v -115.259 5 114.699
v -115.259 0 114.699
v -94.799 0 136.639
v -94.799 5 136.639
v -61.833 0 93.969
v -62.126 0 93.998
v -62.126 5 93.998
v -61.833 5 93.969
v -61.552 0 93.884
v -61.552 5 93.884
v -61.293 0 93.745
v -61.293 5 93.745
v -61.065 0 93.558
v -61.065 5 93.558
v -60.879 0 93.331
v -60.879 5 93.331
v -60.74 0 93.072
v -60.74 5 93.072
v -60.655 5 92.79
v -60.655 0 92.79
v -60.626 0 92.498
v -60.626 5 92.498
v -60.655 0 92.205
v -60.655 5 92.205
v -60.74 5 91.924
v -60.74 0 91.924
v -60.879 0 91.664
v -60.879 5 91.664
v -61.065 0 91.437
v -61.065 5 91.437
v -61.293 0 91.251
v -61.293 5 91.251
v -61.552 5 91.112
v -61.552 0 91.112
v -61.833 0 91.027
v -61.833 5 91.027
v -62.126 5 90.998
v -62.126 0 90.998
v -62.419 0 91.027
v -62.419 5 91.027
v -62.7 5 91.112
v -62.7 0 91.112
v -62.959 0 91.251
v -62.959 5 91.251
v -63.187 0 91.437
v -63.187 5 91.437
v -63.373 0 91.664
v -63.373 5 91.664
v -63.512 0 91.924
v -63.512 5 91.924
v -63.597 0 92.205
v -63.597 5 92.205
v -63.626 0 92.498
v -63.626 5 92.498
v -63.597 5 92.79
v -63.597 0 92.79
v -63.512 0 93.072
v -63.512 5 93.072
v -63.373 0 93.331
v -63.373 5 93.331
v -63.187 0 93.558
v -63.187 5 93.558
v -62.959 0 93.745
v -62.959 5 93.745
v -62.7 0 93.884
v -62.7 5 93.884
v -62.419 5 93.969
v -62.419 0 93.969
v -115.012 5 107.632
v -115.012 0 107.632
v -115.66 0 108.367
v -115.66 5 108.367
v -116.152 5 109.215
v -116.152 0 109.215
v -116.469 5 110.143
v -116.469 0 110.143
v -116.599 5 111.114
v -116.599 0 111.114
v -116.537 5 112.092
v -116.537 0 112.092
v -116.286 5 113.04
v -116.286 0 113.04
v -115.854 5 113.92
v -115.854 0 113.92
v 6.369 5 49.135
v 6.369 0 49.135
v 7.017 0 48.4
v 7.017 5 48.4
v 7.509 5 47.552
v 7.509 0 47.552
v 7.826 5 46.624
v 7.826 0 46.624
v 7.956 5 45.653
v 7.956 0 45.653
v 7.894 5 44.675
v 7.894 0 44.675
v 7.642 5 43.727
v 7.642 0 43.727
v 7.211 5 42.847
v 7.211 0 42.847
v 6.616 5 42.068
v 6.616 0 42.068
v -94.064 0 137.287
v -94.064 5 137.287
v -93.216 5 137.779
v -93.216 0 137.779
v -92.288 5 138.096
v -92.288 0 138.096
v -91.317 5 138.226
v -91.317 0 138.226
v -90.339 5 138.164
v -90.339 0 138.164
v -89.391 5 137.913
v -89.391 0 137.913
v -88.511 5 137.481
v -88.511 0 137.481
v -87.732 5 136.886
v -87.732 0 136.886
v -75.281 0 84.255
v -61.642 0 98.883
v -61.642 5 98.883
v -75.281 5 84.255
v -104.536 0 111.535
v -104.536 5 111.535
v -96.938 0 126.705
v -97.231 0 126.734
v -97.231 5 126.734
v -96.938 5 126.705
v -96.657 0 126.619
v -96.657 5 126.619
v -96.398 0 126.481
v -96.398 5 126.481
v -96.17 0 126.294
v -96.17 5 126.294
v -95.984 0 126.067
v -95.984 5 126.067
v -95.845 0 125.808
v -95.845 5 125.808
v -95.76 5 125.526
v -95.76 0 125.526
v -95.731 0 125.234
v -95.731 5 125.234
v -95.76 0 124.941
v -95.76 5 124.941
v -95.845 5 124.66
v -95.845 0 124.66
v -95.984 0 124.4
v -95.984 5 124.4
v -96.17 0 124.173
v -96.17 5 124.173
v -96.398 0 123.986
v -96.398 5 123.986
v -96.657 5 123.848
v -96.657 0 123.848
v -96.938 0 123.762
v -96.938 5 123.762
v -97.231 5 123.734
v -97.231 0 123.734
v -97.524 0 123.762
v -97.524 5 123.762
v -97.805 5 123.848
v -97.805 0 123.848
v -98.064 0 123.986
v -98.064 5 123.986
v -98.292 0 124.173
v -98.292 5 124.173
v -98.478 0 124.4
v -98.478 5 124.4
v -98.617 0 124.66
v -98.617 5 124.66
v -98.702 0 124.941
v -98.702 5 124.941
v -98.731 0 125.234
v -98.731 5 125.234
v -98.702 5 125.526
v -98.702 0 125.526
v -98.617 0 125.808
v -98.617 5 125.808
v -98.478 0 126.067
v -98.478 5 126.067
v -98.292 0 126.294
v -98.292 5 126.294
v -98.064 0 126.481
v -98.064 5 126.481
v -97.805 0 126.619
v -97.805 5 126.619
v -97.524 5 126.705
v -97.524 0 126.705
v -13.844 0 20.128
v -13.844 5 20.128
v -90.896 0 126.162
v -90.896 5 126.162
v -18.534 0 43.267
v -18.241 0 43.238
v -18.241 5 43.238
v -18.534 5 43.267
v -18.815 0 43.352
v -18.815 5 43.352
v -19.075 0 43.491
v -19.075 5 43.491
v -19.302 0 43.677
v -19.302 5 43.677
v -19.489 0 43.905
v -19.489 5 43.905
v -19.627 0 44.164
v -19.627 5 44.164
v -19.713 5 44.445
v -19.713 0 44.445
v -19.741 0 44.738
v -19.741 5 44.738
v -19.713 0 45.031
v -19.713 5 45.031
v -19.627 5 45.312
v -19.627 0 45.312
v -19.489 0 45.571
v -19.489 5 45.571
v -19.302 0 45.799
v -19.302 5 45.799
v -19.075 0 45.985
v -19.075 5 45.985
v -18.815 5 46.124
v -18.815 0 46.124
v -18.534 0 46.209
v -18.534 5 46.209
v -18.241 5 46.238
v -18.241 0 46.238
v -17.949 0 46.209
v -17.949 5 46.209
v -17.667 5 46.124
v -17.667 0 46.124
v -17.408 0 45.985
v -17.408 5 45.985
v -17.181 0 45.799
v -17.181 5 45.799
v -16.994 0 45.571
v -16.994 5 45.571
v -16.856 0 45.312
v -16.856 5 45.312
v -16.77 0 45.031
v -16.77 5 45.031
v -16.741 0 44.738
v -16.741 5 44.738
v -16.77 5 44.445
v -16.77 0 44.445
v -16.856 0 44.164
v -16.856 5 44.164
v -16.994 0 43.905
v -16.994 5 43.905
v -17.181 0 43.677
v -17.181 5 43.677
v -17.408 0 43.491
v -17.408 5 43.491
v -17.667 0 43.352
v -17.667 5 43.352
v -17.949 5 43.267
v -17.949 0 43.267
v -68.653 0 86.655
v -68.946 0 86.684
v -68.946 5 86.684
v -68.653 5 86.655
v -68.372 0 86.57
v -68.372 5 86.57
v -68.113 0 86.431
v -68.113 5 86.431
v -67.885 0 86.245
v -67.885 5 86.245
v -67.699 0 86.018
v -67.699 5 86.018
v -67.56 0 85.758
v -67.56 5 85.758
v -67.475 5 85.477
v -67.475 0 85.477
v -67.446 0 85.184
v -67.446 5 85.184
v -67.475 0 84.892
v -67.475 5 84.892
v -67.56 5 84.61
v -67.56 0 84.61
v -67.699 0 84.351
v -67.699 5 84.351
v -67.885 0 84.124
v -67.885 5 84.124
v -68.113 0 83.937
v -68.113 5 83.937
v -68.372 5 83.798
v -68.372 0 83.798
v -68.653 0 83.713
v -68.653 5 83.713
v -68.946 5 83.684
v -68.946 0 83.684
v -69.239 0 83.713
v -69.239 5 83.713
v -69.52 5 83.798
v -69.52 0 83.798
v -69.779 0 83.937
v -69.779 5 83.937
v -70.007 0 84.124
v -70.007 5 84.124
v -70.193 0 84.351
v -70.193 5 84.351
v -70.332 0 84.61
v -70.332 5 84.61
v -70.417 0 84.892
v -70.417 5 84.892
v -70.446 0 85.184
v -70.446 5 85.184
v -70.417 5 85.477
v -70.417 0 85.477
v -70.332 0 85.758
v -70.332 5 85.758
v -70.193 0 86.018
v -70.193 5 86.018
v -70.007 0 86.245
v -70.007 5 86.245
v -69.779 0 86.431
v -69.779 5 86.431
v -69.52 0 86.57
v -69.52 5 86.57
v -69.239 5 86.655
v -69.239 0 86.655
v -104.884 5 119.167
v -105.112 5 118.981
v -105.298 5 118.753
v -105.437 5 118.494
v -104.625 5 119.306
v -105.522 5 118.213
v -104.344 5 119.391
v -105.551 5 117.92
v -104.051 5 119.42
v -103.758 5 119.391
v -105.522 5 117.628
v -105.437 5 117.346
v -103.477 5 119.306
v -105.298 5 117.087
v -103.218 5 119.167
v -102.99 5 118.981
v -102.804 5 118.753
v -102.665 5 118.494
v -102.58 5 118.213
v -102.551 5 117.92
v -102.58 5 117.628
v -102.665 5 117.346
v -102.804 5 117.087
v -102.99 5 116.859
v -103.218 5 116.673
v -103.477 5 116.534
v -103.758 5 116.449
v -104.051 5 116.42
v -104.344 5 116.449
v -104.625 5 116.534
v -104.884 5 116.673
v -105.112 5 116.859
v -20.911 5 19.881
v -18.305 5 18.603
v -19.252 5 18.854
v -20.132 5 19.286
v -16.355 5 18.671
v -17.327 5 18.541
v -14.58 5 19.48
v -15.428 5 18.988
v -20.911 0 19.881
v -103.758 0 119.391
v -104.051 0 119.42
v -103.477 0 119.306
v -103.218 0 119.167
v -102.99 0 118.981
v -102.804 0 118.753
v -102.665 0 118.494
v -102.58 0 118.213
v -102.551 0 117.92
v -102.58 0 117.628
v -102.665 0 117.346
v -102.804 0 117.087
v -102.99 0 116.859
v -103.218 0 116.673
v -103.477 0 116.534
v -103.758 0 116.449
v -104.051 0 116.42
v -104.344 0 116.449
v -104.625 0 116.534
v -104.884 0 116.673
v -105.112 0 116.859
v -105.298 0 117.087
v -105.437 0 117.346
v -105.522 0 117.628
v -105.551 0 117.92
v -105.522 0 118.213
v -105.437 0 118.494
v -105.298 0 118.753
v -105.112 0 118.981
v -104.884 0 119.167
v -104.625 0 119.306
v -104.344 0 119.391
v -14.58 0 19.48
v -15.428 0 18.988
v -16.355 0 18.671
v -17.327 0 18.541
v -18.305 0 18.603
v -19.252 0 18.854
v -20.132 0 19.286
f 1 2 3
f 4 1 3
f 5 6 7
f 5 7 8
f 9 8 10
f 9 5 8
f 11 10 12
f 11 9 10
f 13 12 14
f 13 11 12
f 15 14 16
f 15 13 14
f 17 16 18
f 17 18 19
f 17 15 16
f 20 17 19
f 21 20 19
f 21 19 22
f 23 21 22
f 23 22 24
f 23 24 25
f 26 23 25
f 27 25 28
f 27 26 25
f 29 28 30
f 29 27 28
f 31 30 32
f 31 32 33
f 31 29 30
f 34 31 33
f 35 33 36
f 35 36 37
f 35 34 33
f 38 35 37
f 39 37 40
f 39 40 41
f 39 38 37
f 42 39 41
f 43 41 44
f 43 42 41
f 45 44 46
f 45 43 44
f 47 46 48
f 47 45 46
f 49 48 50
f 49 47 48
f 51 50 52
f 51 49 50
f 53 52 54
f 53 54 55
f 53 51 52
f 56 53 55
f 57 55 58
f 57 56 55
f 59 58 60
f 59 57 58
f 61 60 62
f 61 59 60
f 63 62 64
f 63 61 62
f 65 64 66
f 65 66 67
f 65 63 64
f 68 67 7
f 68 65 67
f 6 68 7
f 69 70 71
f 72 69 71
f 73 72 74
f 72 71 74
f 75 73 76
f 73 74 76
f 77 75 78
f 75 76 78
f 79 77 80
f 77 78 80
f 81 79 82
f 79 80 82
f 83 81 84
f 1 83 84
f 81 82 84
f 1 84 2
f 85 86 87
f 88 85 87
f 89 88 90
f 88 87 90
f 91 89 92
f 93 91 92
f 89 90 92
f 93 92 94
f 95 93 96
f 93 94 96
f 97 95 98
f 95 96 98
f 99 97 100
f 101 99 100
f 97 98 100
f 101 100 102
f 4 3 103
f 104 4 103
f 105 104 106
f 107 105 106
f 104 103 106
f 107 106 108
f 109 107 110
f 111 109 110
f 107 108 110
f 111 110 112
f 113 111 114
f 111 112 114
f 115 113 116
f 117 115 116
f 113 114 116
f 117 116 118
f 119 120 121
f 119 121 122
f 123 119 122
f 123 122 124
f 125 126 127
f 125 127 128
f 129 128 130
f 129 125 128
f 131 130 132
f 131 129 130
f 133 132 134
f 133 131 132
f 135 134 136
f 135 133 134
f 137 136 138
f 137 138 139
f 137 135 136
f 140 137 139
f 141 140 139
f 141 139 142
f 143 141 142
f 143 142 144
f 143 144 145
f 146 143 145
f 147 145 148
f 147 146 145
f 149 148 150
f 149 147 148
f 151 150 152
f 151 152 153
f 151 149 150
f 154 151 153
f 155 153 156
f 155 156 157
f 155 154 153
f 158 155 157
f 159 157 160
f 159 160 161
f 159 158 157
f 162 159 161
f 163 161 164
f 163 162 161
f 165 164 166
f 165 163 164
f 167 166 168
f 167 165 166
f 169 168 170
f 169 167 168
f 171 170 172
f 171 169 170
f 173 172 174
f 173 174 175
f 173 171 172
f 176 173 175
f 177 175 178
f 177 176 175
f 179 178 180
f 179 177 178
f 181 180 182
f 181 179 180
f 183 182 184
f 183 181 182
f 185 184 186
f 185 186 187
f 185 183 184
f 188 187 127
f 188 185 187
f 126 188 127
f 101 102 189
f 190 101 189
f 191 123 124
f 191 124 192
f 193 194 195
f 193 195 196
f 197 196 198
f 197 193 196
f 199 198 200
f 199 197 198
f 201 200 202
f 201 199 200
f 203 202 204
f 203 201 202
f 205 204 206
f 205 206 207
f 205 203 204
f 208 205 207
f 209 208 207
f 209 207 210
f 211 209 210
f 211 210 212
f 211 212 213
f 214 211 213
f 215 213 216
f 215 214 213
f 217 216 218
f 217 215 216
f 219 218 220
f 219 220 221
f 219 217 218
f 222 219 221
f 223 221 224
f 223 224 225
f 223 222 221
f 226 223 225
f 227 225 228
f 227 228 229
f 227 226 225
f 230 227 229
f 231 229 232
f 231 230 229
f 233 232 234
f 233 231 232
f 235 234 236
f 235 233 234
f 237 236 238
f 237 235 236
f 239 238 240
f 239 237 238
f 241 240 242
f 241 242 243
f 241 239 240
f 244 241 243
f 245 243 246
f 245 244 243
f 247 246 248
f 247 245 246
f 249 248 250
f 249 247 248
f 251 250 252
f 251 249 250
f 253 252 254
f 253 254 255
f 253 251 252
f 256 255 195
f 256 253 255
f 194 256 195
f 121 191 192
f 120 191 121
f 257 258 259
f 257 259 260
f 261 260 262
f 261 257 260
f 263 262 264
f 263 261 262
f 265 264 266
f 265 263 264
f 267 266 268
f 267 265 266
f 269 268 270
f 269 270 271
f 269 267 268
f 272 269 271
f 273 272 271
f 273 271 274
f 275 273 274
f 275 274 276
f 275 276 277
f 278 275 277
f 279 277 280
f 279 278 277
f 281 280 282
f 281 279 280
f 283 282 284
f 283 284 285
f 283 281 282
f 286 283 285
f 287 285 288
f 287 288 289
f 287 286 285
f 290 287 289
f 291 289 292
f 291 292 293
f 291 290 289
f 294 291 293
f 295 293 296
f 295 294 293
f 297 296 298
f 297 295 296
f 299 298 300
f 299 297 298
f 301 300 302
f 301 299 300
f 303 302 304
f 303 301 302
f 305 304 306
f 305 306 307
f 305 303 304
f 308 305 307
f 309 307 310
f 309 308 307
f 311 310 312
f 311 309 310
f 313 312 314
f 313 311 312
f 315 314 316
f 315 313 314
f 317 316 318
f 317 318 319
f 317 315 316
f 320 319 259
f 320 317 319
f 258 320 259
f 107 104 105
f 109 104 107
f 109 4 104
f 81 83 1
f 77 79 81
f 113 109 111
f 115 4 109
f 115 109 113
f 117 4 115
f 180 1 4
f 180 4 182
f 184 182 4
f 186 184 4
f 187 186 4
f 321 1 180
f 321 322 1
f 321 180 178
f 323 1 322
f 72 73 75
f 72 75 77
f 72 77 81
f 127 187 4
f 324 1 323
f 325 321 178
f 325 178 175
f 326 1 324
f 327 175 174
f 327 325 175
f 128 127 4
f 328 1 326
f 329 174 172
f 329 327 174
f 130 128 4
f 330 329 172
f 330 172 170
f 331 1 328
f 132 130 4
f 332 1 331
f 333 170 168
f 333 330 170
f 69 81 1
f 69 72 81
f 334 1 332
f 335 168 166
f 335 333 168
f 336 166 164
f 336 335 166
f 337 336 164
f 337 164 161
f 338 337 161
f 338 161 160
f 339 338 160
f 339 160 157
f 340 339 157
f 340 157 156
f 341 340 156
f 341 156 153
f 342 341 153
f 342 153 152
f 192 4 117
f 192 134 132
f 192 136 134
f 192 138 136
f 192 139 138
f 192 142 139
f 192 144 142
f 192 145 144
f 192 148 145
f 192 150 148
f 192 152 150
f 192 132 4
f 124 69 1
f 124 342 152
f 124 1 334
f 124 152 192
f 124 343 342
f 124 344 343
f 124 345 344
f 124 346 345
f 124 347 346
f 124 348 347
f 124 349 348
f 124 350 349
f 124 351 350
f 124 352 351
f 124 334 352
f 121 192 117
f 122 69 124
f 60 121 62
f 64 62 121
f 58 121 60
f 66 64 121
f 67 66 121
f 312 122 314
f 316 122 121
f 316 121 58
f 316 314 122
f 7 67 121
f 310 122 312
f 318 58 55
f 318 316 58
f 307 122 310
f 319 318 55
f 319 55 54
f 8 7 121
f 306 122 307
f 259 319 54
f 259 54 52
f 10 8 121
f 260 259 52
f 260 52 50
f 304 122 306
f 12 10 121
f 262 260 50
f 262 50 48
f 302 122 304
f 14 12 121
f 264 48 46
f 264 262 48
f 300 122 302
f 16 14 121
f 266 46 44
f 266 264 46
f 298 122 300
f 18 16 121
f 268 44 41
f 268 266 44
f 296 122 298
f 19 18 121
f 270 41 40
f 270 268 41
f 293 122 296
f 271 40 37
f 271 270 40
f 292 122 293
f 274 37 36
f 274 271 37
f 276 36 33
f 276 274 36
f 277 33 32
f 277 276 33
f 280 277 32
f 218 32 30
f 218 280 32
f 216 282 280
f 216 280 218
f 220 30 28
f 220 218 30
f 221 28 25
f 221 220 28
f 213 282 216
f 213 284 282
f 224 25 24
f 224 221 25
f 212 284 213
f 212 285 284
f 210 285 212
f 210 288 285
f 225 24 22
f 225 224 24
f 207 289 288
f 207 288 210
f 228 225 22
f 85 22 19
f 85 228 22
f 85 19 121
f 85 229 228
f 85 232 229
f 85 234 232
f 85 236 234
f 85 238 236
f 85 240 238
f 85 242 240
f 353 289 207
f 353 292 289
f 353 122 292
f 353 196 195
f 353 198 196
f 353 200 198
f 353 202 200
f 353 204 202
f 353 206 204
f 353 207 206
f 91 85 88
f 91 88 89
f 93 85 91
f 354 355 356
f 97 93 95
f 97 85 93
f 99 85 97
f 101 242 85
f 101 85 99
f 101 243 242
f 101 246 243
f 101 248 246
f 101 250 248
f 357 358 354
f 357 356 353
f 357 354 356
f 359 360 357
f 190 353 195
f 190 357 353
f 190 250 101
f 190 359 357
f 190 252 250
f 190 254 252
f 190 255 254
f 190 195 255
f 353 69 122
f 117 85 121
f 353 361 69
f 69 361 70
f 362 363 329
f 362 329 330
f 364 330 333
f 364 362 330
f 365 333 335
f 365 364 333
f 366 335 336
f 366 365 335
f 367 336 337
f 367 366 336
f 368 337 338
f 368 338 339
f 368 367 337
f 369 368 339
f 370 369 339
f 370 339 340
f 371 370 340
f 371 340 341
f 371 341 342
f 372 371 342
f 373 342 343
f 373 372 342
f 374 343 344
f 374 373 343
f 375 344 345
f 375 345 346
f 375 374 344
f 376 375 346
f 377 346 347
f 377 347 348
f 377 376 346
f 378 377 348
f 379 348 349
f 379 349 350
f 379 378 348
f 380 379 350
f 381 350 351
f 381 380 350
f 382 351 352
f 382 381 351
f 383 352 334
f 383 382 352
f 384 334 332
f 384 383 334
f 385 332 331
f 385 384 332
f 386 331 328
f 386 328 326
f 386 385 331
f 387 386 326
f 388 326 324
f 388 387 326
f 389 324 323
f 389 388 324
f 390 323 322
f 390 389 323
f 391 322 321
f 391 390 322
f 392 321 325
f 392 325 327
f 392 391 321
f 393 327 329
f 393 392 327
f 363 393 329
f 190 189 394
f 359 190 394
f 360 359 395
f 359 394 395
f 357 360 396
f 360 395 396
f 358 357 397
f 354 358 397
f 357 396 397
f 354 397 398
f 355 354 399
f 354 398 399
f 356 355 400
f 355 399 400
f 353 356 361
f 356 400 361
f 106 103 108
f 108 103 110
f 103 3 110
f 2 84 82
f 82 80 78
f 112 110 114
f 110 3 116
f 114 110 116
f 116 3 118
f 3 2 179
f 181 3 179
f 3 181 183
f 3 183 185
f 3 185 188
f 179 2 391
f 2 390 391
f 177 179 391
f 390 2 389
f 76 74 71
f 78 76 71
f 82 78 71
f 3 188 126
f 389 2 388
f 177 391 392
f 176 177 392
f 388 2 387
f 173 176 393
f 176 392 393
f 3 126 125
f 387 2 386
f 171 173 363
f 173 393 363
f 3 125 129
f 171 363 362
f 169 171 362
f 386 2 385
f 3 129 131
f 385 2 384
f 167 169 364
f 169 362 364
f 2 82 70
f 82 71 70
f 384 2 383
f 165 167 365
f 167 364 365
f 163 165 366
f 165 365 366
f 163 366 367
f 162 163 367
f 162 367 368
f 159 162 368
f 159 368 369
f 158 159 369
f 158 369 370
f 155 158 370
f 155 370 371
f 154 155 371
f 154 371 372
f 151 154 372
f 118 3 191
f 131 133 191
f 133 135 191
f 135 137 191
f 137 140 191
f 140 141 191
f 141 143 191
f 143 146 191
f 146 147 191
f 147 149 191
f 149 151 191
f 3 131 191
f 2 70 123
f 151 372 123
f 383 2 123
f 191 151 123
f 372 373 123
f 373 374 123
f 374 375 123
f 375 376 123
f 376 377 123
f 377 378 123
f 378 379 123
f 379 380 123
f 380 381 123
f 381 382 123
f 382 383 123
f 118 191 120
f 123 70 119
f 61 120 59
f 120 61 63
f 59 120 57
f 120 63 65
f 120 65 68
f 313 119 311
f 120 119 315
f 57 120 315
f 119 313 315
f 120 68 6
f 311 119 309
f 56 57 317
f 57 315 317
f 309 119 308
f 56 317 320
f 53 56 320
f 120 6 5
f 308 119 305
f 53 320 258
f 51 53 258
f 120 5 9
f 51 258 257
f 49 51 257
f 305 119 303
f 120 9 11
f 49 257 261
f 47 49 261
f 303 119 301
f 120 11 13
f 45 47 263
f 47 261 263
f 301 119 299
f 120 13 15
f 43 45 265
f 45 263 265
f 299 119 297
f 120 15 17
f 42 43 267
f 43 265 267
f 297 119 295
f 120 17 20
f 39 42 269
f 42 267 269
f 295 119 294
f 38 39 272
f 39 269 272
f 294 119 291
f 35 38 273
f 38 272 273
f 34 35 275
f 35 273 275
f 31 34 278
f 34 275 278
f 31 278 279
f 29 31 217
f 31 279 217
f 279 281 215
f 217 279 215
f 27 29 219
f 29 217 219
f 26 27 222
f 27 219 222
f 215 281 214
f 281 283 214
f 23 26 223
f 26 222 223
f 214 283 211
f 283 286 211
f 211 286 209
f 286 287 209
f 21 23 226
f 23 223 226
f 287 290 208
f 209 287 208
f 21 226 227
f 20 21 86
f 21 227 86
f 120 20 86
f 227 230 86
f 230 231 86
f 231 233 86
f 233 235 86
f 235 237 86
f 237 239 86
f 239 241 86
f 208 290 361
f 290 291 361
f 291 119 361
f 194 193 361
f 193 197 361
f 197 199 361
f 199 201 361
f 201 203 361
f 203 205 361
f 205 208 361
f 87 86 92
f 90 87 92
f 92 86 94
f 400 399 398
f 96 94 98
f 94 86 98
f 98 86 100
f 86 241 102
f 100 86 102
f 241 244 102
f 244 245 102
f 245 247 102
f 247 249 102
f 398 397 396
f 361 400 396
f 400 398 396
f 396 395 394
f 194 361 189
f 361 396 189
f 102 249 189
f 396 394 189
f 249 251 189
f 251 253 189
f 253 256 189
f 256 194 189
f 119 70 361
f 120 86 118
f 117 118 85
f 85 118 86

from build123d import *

# Parameters (mm, degrees)
SKETCH_1_R      = 1.5
EXTRUDE_1_DEPTH = 5


with BuildPart() as part:
    # 草图1 → 凸台-拉伸1 (new body)
    with BuildSketch(Plane(origin=(0, 0, 0), x_dir=(1, 0, 0), z_dir=(0, 1, 0))):
        with BuildLine():
            Line((-20.911015375, -19.880881436), (-115.012388245, -107.631831263))
            ThreePointArc((-115.012388245, -107.631831263), (-116.599350579, -111.114102288), (-115.259164952, -114.698591572))
            Line((-115.259164952, -114.698591572), (-94.79921415, -136.63920262))
            ThreePointArc((-94.79921415, -136.63920262), (-91.316943126, -138.226164955), (-87.732453842, -136.885979328))
            Line((-87.732453842, -136.885979328), (6.368919028, -49.135029501))
            ThreePointArc((6.368919028, -49.135029501), (7.955881363, -45.652758476), (6.615695736, -42.068269192))
            Line((6.615695736, -42.068269192), (-13.844255066, -20.127658144))
            ThreePointArc((-13.844255066, -20.127658144), (-17.326526091, -18.540695809), (-20.911015375, -19.880881436))
        make_face()
        with Locations(Location((-97.231075541, -125.233675444, 0), (0, 0, 270))):
            Circle(SKETCH_1_R, mode=Mode.SUBTRACT)
        with Locations(Location((-104.051059142, -117.920138427, 0), (0, 0, 270))):
            Circle(SKETCH_1_R, mode=Mode.SUBTRACT)
        with Locations(Location((-62.126097864, -92.497754161, 0), (0, 0, 270))):
            Circle(SKETCH_1_R, mode=Mode.SUBTRACT)
        with Locations(Location((-68.946081464, -85.184217144, 0), (0, 0, 270))):
            Circle(SKETCH_1_R, mode=Mode.SUBTRACT)
        with Locations(Location((-18.241353698, -44.737930869, 0), (0, 0, 90))):
            Circle(SKETCH_1_R, mode=Mode.SUBTRACT)
        Polygon((-90.895668935, -126.162450512), (-61.64152087, -98.882516109), (-75.281488071, -84.255442077), (-104.535636136, -111.535376479), align=None, mode=Mode.SUBTRACT)
    extrude(amount=EXTRUDE_1_DEPTH)


solid = part.part
